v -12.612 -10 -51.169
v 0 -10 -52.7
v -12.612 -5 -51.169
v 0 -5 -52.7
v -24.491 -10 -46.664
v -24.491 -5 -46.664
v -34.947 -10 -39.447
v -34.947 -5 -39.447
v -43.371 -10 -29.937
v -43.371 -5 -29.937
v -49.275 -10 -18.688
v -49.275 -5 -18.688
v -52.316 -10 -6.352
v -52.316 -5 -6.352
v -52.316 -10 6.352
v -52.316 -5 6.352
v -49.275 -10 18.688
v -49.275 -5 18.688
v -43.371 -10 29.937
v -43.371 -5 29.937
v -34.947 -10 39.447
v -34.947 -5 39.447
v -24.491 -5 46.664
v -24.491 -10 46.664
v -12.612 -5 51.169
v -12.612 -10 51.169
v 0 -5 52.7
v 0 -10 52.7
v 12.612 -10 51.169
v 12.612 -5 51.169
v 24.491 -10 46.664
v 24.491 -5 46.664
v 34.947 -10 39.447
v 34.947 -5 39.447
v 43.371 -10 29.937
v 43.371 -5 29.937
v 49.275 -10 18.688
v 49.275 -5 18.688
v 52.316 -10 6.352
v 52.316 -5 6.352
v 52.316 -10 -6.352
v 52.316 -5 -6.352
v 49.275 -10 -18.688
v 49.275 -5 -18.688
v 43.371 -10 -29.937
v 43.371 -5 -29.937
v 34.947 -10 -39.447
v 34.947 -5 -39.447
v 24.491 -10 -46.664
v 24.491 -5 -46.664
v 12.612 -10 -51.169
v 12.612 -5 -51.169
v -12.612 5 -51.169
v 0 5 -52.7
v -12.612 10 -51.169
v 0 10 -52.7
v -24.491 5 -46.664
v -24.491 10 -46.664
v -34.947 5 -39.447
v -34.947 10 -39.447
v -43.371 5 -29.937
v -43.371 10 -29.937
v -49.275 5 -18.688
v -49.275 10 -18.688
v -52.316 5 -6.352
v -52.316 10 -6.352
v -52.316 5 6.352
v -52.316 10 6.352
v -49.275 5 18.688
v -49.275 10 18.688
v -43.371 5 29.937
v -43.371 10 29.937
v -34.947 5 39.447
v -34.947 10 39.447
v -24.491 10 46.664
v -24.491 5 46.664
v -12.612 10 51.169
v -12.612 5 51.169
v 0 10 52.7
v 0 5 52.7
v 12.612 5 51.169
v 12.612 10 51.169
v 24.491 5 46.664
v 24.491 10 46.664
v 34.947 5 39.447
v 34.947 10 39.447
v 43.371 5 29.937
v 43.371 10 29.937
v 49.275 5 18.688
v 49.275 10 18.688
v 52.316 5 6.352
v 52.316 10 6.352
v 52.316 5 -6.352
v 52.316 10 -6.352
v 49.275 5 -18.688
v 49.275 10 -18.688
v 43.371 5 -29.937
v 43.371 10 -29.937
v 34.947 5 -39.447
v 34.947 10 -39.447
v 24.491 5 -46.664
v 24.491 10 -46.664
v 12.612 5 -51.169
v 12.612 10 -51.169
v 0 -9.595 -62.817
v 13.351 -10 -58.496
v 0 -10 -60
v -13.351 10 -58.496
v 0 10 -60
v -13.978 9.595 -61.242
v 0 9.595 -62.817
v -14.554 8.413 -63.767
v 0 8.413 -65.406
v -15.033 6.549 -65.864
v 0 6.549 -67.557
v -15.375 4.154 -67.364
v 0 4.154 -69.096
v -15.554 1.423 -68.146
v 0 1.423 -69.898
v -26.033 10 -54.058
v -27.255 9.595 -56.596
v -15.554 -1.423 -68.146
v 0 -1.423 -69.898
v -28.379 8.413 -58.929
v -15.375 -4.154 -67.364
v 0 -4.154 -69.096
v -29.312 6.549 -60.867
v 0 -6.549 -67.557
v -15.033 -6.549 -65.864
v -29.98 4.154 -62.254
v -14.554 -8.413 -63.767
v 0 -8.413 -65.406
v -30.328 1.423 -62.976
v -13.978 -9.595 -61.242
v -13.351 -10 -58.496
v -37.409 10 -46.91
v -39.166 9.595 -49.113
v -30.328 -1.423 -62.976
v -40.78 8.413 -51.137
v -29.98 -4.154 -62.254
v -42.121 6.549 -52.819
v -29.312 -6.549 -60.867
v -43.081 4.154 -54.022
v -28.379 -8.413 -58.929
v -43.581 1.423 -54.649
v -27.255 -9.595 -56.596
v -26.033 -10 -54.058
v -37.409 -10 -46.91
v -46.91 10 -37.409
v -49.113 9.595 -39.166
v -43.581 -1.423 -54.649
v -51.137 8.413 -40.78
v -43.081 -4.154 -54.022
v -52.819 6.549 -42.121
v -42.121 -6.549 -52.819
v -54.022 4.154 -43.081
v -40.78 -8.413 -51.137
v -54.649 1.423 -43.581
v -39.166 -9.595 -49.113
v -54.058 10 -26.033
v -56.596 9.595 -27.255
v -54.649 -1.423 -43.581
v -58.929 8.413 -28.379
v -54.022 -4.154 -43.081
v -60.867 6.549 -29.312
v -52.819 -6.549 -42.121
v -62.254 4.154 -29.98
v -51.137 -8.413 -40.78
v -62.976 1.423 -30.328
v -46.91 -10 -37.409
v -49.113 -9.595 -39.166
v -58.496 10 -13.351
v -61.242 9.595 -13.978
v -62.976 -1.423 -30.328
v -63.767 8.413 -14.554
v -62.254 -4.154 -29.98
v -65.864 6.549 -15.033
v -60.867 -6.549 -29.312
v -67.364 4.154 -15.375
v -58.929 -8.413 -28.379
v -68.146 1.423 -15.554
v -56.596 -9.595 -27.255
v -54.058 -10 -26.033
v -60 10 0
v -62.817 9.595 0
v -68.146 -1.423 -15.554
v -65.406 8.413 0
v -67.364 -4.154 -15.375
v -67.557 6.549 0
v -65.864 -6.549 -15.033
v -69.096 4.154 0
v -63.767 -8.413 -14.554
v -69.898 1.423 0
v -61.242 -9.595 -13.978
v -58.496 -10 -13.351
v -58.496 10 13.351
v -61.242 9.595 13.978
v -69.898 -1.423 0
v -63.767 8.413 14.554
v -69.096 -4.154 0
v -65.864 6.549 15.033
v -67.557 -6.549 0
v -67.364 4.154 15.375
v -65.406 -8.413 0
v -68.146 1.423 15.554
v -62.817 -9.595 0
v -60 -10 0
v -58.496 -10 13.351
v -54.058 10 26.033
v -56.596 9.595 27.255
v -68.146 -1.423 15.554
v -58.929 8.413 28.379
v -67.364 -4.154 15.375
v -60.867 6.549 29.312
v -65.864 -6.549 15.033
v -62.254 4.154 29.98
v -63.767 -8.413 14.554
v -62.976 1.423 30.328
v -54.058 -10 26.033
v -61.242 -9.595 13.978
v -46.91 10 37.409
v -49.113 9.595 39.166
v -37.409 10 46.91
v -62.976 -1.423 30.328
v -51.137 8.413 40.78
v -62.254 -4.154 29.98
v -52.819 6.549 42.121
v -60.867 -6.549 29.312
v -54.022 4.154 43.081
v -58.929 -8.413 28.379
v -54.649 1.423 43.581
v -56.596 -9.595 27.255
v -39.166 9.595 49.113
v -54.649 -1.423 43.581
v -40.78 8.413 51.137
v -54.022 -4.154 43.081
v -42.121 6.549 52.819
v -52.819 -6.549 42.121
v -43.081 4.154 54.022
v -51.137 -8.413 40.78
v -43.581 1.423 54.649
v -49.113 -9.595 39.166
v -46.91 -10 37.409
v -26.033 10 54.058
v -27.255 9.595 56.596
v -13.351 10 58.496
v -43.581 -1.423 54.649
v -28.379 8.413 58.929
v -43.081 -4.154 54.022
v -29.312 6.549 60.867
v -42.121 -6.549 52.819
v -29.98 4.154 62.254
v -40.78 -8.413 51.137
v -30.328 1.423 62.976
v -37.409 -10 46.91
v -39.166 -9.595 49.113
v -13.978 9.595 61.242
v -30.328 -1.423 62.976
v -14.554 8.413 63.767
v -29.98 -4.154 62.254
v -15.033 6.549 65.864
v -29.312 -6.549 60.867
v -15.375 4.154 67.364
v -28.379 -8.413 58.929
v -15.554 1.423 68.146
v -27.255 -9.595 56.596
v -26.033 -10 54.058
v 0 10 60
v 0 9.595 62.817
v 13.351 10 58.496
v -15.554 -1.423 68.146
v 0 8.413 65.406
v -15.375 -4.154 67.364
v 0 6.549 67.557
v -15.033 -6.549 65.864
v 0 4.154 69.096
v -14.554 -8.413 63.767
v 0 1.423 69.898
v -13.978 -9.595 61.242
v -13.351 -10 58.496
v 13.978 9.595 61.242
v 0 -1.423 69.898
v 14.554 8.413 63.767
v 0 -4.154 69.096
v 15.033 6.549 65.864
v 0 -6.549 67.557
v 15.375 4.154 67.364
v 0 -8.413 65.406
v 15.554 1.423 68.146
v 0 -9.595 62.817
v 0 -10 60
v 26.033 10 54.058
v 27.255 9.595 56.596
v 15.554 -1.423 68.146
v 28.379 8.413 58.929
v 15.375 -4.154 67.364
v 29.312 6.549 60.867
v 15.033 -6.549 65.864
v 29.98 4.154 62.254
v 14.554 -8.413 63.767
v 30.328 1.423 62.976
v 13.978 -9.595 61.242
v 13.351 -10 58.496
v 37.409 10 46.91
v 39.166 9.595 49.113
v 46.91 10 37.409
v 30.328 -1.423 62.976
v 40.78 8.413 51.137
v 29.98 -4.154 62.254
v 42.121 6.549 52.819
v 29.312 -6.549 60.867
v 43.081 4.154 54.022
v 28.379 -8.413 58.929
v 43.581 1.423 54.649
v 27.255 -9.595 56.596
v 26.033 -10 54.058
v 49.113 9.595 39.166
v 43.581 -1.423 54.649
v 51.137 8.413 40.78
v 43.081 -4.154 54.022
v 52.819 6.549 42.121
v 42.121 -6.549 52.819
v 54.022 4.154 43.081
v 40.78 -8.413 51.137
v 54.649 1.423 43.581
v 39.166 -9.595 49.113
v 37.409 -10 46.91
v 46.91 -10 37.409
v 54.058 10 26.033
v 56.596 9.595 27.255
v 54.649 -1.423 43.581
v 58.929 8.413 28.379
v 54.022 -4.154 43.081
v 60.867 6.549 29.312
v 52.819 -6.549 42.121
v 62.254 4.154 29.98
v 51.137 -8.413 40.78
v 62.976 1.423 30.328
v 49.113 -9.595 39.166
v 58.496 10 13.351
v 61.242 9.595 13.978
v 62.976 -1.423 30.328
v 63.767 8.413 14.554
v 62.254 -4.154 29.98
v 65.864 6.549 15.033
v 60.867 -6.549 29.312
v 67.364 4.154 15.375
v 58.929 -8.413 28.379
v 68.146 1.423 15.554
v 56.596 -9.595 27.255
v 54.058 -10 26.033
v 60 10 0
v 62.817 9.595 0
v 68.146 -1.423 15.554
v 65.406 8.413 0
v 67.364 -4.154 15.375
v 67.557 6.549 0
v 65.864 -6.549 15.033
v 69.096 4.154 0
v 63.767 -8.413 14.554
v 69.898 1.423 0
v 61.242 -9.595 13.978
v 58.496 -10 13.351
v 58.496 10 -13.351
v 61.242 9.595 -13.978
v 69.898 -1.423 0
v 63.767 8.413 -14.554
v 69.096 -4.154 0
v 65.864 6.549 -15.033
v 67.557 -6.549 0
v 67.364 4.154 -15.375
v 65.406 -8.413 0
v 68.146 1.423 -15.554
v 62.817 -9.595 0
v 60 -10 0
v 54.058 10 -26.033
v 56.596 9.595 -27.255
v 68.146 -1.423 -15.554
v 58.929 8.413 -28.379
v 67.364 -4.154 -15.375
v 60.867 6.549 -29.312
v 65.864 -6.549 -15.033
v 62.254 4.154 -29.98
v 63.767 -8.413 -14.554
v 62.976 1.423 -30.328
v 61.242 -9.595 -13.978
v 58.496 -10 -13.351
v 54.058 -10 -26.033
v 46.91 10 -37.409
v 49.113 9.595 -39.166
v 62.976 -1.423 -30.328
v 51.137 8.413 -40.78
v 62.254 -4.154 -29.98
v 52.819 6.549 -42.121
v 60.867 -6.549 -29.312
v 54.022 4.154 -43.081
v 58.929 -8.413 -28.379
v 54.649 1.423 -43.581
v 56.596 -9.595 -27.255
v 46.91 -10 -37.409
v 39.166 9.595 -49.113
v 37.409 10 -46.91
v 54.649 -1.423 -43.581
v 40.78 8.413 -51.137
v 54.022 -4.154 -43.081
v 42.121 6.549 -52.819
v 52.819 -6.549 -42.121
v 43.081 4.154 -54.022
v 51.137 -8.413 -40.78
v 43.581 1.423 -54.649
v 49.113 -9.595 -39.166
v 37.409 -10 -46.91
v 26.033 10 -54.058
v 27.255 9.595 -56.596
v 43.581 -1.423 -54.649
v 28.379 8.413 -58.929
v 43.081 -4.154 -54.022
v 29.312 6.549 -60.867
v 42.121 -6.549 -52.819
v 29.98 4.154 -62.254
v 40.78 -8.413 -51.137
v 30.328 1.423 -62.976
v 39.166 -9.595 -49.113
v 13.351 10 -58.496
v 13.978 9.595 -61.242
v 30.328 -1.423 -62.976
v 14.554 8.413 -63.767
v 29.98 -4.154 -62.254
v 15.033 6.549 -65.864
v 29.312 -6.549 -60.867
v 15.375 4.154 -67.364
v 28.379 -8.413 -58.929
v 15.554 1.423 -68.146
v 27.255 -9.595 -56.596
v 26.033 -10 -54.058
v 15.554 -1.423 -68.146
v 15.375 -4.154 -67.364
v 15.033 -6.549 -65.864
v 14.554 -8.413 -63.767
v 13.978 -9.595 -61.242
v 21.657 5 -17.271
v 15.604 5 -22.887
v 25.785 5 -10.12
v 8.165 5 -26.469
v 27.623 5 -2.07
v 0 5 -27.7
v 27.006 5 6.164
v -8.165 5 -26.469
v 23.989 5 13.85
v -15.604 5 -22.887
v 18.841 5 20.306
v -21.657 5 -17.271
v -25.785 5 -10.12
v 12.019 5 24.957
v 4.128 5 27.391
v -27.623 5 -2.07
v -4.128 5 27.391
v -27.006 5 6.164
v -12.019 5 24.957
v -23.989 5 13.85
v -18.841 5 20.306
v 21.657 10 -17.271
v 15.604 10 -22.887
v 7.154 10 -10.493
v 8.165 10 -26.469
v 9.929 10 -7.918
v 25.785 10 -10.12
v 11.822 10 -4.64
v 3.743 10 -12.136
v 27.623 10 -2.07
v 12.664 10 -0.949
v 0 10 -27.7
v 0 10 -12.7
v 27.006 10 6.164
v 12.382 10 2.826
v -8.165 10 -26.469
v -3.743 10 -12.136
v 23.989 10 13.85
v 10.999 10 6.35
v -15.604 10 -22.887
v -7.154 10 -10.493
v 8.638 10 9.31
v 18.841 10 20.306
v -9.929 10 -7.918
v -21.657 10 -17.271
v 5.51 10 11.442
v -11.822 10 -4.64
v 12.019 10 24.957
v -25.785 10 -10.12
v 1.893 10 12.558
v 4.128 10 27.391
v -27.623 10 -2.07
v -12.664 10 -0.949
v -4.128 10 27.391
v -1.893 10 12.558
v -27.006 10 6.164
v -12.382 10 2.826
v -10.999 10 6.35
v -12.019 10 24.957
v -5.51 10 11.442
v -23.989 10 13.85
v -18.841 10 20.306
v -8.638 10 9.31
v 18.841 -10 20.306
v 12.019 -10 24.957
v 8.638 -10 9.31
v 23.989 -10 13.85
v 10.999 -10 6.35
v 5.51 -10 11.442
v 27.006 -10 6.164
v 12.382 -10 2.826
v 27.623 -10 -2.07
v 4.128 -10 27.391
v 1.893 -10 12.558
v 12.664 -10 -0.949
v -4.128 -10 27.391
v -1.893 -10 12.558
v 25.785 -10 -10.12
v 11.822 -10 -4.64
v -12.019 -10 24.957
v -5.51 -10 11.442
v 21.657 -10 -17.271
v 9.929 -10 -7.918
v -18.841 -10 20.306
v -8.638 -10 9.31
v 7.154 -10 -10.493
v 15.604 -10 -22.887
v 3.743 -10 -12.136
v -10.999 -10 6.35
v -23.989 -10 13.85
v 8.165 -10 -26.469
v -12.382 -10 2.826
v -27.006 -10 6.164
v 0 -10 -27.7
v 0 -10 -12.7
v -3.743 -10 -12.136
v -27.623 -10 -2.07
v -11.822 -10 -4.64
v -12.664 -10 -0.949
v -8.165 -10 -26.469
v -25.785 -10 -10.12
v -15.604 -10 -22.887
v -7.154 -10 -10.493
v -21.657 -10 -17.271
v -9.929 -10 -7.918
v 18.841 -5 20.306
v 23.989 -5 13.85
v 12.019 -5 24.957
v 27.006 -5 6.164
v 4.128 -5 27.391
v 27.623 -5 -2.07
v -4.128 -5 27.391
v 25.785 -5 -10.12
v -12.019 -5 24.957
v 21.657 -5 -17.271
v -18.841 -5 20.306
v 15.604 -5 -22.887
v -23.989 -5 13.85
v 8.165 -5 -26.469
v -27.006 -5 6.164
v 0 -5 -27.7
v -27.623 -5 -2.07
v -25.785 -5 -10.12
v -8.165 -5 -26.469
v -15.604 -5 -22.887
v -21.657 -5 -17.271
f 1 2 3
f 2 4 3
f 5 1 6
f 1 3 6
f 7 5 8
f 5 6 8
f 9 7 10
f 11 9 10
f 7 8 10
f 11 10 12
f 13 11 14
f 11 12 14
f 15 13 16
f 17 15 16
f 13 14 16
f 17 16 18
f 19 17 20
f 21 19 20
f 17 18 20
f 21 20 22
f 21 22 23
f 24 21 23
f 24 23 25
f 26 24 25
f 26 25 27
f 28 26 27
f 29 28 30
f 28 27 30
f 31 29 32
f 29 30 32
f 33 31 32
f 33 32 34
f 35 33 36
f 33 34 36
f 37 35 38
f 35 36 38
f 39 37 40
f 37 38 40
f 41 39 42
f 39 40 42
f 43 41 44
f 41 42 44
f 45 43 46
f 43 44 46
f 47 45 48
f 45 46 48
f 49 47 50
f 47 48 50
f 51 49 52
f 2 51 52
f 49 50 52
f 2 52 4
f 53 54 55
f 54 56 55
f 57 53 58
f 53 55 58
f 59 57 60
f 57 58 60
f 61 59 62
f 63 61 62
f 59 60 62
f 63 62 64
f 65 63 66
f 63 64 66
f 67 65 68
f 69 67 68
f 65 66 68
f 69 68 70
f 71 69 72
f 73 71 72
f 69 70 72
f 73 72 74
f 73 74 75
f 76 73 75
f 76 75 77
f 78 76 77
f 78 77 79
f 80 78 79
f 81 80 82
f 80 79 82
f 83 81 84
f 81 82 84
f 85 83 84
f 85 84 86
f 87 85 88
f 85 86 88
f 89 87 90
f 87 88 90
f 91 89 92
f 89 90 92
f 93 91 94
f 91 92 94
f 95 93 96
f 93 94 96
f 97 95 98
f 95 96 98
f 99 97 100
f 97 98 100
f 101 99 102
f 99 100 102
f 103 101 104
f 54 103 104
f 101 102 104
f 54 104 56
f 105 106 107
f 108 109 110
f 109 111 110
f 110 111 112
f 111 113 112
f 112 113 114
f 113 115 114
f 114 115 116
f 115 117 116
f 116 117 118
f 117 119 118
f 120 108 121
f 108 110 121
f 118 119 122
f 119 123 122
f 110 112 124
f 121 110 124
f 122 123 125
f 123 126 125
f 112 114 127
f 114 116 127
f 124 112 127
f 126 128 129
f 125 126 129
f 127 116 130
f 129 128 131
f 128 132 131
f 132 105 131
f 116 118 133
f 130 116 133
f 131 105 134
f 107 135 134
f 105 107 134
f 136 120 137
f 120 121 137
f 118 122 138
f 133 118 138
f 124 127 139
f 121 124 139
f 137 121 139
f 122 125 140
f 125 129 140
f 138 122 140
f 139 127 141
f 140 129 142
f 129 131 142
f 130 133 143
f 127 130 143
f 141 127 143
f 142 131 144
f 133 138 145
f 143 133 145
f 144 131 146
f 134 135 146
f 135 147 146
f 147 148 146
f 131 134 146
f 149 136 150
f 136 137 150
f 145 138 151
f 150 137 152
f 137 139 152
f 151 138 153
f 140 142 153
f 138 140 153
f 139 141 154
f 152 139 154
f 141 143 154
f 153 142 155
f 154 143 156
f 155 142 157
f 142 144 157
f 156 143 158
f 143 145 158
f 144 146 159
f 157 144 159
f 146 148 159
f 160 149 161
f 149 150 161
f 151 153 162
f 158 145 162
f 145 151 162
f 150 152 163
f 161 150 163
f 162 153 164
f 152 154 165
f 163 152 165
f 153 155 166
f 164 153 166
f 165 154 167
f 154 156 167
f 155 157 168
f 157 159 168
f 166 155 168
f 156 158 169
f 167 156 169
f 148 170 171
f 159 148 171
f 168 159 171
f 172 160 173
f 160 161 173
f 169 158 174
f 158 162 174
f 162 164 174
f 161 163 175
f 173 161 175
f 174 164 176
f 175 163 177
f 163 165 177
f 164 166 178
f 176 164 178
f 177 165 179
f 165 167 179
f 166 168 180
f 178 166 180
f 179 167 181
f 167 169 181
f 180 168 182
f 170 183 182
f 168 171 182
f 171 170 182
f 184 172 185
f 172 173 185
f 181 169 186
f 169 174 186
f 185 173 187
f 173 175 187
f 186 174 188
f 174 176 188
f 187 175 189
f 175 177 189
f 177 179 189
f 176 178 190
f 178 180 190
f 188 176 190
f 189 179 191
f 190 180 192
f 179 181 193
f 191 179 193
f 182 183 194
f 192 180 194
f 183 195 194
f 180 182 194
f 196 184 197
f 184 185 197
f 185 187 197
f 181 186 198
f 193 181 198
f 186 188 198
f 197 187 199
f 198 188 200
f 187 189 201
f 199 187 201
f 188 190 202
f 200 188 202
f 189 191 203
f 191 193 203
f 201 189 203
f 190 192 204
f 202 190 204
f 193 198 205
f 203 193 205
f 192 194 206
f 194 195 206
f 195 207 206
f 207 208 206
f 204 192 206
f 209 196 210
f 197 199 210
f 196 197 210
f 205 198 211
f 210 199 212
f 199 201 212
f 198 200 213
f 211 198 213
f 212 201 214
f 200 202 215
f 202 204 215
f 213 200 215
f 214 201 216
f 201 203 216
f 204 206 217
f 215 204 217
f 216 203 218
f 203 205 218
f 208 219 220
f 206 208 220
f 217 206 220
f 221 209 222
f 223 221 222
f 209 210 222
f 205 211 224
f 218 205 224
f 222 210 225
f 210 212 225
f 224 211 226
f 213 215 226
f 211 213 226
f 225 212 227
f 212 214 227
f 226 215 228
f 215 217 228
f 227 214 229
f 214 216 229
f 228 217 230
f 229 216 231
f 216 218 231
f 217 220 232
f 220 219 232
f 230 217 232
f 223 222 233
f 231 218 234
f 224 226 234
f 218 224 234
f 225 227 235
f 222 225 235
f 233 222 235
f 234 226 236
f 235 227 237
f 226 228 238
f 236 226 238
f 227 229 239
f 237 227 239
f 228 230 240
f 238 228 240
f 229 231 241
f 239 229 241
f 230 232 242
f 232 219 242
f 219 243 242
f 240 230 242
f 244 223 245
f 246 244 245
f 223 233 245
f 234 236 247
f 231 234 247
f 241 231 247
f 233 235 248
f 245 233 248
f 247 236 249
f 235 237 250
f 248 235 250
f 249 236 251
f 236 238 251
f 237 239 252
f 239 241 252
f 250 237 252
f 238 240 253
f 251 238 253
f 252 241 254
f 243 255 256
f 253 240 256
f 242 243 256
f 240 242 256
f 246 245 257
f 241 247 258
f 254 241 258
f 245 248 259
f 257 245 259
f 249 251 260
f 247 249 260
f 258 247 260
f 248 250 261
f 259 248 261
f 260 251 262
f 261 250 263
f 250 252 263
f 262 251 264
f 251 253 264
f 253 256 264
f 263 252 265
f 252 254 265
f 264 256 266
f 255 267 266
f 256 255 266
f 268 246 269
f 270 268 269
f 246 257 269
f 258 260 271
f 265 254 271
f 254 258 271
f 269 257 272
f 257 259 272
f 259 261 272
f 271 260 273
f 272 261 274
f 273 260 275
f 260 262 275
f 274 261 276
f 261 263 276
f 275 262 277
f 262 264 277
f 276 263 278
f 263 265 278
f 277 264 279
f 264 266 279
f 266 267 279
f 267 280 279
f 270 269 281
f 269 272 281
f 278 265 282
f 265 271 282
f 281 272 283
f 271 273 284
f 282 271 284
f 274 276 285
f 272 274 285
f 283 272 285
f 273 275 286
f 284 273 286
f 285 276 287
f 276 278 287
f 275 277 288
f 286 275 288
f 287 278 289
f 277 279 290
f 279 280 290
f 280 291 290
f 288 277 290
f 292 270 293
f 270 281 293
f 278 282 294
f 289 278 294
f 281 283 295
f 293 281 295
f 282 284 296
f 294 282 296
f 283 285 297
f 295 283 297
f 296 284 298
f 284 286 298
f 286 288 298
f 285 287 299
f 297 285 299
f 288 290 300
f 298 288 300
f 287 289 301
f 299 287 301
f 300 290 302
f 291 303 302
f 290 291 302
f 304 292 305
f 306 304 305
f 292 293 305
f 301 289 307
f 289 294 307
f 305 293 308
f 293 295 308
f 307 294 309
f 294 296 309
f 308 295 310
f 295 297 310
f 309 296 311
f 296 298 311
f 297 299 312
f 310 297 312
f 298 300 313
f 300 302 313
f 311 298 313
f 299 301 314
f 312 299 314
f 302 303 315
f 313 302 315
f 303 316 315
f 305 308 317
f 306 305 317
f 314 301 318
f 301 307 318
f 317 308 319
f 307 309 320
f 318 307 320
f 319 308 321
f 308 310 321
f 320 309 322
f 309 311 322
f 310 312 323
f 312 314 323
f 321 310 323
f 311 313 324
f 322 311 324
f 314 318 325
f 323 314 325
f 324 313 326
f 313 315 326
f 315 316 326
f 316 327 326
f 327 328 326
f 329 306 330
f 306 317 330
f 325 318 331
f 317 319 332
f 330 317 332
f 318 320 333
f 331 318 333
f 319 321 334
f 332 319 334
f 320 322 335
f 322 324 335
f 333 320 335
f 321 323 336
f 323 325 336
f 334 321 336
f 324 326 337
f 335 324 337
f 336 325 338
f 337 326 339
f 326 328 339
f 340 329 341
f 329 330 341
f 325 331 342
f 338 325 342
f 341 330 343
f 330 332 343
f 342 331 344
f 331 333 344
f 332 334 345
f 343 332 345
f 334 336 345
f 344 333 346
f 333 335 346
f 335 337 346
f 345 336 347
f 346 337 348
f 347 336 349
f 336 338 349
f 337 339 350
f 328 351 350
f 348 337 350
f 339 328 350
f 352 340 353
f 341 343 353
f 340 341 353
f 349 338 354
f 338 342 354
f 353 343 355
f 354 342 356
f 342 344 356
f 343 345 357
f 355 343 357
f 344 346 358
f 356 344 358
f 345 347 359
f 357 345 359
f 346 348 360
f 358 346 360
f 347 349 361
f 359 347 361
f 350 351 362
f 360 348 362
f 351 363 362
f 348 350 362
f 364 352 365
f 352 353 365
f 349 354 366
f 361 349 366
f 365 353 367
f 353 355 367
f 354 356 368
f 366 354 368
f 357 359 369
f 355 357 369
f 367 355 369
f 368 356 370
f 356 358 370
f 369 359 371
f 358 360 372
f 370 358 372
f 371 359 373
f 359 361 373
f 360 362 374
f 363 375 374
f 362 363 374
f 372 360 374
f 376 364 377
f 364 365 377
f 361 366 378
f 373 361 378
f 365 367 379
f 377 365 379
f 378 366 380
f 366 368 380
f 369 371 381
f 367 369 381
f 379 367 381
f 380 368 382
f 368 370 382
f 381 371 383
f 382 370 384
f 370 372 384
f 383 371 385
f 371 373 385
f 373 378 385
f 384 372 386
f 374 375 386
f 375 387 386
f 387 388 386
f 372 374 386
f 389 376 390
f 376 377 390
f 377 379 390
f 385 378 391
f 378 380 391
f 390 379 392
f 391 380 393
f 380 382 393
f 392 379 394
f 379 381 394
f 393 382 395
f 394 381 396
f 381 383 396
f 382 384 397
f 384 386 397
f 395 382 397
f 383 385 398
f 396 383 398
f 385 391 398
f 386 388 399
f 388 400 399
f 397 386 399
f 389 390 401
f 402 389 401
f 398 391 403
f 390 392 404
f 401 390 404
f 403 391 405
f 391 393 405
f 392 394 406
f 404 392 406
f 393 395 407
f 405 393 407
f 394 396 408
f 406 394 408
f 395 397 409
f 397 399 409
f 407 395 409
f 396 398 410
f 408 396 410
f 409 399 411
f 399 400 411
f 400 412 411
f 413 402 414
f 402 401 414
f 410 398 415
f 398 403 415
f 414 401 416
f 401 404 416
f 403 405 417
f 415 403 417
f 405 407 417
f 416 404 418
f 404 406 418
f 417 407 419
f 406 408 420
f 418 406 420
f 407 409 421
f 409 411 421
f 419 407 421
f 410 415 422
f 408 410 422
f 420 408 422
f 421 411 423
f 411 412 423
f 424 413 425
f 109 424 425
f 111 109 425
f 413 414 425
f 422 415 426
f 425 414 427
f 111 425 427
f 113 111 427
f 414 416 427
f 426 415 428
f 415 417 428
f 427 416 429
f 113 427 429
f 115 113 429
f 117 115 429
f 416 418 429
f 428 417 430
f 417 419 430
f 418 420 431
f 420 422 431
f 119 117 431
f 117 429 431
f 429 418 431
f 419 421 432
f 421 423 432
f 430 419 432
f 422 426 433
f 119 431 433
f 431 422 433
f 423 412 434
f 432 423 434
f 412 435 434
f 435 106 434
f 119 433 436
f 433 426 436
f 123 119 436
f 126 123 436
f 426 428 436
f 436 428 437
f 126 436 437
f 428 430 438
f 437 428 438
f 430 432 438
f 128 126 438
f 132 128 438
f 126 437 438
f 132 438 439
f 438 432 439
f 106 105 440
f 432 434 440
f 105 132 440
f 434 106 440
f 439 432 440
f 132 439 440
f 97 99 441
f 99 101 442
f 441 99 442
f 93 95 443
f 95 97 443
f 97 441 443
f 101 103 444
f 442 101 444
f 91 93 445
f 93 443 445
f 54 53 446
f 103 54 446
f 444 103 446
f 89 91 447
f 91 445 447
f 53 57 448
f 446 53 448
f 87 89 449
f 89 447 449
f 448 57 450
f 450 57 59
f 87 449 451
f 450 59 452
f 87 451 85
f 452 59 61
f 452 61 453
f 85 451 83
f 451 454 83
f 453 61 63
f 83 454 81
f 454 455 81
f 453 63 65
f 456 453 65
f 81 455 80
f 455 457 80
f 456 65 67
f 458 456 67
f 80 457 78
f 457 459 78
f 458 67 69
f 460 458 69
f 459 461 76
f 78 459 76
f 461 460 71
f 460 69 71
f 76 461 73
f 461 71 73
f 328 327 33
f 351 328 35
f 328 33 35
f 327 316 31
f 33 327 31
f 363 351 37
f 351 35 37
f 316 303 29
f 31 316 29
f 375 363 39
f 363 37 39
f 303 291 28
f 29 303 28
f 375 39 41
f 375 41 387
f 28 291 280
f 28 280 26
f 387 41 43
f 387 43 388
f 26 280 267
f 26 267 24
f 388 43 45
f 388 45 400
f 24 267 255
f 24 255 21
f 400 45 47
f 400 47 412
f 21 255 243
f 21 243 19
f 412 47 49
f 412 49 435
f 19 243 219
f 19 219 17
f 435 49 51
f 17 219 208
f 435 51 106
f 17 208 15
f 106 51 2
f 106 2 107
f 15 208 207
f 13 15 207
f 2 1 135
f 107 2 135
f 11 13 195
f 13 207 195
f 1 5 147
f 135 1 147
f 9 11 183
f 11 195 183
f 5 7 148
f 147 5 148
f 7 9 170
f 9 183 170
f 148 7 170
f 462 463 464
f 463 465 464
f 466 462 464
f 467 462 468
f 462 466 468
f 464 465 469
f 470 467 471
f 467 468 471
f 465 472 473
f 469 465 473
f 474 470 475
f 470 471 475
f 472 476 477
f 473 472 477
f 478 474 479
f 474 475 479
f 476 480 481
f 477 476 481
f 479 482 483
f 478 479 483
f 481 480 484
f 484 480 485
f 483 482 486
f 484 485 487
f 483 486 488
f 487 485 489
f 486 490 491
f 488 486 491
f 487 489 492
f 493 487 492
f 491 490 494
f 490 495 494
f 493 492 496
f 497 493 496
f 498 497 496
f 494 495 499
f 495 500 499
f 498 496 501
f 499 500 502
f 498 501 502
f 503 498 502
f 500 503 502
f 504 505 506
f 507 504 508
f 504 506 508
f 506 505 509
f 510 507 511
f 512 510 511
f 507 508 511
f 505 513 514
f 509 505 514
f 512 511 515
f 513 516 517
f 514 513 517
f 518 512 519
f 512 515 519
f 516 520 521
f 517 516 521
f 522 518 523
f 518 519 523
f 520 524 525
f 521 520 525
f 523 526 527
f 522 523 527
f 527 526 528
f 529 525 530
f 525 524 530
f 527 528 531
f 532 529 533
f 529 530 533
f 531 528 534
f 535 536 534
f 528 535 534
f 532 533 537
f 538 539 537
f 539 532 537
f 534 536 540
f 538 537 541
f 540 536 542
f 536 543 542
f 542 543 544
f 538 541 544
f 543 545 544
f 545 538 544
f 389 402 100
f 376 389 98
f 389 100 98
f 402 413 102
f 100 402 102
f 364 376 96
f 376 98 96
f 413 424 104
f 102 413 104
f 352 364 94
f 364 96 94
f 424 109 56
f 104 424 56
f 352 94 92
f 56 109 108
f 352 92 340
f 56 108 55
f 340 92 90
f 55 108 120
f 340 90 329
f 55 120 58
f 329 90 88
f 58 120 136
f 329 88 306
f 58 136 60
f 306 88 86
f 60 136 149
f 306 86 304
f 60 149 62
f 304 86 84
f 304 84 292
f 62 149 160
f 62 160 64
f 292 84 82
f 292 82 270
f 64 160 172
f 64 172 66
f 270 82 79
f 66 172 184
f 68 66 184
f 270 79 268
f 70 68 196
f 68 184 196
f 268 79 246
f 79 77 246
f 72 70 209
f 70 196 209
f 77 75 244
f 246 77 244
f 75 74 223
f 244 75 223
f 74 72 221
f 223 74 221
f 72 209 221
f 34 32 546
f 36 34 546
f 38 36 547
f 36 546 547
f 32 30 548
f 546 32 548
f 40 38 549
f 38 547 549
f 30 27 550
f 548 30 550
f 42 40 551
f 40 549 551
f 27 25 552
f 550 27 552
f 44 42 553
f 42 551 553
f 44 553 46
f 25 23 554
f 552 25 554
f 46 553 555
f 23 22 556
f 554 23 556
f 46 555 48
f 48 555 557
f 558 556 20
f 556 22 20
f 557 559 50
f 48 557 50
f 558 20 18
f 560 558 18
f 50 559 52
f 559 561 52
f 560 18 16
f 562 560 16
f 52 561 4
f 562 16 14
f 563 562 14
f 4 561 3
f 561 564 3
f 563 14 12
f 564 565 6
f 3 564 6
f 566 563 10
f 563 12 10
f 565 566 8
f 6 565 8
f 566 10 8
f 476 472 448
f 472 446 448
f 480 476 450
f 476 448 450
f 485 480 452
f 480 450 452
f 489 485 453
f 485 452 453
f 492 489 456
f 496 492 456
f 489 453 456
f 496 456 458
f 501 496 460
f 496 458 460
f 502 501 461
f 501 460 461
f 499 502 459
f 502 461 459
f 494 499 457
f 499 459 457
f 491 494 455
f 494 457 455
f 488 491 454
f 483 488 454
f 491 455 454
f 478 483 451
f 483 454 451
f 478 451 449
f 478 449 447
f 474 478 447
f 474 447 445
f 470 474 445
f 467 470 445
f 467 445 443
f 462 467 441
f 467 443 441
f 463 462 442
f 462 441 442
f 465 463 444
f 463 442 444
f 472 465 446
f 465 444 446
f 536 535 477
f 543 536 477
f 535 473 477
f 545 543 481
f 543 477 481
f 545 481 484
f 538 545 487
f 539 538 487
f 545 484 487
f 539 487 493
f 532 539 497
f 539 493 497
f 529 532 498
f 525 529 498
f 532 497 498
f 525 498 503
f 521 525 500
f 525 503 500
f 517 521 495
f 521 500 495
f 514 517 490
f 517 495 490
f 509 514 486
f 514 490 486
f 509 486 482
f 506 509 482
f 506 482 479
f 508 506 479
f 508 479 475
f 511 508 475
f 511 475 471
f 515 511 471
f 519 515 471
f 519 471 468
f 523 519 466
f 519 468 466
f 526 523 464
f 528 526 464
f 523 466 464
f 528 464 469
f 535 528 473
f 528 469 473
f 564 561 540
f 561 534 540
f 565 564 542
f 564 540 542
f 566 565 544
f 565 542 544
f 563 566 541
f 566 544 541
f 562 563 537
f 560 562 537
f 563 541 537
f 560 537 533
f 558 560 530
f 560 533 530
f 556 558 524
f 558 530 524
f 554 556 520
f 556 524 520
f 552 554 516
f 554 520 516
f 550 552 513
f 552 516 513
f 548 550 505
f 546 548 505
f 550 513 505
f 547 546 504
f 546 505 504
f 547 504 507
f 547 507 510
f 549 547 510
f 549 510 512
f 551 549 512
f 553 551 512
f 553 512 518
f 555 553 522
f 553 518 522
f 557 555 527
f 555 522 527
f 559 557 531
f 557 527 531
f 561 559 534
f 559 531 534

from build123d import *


with BuildPart() as part:
    # Croquis1 → Revolución1 (revolve)
    with BuildSketch(Plane.XY, mode=Mode.PRIVATE) as revoluci_n1_sk:
        with BuildLine():
            Line((12.7, -10), (12.7, 10))
            Line((12.7, 10), (27.7, 10))
            Line((27.7, 10), (27.7, 5))
            Line((27.7, 5), (52.7, 5))
            Line((52.7, 5), (52.7, 10))
            Line((52.7, 10), (60, 10))
            ThreePointArc((60, 10), (70, 0), (60, -10))
            Line((60, -10), (52.7, -10))
            Line((52.7, -10), (52.7, -5))
            Line((52.7, -5), (27.7, -5))
            Line((27.7, -5), (27.7, -10))
            Line((27.7, -10), (12.7, -10))
        make_face()
    revolve(revoluci_n1_sk.sketch.rotate(Axis((0, 0, 0), (0, 1, 0)), 90), axis=Axis((0, 0, 0), (0, 1, 0)))


solid = part.part
